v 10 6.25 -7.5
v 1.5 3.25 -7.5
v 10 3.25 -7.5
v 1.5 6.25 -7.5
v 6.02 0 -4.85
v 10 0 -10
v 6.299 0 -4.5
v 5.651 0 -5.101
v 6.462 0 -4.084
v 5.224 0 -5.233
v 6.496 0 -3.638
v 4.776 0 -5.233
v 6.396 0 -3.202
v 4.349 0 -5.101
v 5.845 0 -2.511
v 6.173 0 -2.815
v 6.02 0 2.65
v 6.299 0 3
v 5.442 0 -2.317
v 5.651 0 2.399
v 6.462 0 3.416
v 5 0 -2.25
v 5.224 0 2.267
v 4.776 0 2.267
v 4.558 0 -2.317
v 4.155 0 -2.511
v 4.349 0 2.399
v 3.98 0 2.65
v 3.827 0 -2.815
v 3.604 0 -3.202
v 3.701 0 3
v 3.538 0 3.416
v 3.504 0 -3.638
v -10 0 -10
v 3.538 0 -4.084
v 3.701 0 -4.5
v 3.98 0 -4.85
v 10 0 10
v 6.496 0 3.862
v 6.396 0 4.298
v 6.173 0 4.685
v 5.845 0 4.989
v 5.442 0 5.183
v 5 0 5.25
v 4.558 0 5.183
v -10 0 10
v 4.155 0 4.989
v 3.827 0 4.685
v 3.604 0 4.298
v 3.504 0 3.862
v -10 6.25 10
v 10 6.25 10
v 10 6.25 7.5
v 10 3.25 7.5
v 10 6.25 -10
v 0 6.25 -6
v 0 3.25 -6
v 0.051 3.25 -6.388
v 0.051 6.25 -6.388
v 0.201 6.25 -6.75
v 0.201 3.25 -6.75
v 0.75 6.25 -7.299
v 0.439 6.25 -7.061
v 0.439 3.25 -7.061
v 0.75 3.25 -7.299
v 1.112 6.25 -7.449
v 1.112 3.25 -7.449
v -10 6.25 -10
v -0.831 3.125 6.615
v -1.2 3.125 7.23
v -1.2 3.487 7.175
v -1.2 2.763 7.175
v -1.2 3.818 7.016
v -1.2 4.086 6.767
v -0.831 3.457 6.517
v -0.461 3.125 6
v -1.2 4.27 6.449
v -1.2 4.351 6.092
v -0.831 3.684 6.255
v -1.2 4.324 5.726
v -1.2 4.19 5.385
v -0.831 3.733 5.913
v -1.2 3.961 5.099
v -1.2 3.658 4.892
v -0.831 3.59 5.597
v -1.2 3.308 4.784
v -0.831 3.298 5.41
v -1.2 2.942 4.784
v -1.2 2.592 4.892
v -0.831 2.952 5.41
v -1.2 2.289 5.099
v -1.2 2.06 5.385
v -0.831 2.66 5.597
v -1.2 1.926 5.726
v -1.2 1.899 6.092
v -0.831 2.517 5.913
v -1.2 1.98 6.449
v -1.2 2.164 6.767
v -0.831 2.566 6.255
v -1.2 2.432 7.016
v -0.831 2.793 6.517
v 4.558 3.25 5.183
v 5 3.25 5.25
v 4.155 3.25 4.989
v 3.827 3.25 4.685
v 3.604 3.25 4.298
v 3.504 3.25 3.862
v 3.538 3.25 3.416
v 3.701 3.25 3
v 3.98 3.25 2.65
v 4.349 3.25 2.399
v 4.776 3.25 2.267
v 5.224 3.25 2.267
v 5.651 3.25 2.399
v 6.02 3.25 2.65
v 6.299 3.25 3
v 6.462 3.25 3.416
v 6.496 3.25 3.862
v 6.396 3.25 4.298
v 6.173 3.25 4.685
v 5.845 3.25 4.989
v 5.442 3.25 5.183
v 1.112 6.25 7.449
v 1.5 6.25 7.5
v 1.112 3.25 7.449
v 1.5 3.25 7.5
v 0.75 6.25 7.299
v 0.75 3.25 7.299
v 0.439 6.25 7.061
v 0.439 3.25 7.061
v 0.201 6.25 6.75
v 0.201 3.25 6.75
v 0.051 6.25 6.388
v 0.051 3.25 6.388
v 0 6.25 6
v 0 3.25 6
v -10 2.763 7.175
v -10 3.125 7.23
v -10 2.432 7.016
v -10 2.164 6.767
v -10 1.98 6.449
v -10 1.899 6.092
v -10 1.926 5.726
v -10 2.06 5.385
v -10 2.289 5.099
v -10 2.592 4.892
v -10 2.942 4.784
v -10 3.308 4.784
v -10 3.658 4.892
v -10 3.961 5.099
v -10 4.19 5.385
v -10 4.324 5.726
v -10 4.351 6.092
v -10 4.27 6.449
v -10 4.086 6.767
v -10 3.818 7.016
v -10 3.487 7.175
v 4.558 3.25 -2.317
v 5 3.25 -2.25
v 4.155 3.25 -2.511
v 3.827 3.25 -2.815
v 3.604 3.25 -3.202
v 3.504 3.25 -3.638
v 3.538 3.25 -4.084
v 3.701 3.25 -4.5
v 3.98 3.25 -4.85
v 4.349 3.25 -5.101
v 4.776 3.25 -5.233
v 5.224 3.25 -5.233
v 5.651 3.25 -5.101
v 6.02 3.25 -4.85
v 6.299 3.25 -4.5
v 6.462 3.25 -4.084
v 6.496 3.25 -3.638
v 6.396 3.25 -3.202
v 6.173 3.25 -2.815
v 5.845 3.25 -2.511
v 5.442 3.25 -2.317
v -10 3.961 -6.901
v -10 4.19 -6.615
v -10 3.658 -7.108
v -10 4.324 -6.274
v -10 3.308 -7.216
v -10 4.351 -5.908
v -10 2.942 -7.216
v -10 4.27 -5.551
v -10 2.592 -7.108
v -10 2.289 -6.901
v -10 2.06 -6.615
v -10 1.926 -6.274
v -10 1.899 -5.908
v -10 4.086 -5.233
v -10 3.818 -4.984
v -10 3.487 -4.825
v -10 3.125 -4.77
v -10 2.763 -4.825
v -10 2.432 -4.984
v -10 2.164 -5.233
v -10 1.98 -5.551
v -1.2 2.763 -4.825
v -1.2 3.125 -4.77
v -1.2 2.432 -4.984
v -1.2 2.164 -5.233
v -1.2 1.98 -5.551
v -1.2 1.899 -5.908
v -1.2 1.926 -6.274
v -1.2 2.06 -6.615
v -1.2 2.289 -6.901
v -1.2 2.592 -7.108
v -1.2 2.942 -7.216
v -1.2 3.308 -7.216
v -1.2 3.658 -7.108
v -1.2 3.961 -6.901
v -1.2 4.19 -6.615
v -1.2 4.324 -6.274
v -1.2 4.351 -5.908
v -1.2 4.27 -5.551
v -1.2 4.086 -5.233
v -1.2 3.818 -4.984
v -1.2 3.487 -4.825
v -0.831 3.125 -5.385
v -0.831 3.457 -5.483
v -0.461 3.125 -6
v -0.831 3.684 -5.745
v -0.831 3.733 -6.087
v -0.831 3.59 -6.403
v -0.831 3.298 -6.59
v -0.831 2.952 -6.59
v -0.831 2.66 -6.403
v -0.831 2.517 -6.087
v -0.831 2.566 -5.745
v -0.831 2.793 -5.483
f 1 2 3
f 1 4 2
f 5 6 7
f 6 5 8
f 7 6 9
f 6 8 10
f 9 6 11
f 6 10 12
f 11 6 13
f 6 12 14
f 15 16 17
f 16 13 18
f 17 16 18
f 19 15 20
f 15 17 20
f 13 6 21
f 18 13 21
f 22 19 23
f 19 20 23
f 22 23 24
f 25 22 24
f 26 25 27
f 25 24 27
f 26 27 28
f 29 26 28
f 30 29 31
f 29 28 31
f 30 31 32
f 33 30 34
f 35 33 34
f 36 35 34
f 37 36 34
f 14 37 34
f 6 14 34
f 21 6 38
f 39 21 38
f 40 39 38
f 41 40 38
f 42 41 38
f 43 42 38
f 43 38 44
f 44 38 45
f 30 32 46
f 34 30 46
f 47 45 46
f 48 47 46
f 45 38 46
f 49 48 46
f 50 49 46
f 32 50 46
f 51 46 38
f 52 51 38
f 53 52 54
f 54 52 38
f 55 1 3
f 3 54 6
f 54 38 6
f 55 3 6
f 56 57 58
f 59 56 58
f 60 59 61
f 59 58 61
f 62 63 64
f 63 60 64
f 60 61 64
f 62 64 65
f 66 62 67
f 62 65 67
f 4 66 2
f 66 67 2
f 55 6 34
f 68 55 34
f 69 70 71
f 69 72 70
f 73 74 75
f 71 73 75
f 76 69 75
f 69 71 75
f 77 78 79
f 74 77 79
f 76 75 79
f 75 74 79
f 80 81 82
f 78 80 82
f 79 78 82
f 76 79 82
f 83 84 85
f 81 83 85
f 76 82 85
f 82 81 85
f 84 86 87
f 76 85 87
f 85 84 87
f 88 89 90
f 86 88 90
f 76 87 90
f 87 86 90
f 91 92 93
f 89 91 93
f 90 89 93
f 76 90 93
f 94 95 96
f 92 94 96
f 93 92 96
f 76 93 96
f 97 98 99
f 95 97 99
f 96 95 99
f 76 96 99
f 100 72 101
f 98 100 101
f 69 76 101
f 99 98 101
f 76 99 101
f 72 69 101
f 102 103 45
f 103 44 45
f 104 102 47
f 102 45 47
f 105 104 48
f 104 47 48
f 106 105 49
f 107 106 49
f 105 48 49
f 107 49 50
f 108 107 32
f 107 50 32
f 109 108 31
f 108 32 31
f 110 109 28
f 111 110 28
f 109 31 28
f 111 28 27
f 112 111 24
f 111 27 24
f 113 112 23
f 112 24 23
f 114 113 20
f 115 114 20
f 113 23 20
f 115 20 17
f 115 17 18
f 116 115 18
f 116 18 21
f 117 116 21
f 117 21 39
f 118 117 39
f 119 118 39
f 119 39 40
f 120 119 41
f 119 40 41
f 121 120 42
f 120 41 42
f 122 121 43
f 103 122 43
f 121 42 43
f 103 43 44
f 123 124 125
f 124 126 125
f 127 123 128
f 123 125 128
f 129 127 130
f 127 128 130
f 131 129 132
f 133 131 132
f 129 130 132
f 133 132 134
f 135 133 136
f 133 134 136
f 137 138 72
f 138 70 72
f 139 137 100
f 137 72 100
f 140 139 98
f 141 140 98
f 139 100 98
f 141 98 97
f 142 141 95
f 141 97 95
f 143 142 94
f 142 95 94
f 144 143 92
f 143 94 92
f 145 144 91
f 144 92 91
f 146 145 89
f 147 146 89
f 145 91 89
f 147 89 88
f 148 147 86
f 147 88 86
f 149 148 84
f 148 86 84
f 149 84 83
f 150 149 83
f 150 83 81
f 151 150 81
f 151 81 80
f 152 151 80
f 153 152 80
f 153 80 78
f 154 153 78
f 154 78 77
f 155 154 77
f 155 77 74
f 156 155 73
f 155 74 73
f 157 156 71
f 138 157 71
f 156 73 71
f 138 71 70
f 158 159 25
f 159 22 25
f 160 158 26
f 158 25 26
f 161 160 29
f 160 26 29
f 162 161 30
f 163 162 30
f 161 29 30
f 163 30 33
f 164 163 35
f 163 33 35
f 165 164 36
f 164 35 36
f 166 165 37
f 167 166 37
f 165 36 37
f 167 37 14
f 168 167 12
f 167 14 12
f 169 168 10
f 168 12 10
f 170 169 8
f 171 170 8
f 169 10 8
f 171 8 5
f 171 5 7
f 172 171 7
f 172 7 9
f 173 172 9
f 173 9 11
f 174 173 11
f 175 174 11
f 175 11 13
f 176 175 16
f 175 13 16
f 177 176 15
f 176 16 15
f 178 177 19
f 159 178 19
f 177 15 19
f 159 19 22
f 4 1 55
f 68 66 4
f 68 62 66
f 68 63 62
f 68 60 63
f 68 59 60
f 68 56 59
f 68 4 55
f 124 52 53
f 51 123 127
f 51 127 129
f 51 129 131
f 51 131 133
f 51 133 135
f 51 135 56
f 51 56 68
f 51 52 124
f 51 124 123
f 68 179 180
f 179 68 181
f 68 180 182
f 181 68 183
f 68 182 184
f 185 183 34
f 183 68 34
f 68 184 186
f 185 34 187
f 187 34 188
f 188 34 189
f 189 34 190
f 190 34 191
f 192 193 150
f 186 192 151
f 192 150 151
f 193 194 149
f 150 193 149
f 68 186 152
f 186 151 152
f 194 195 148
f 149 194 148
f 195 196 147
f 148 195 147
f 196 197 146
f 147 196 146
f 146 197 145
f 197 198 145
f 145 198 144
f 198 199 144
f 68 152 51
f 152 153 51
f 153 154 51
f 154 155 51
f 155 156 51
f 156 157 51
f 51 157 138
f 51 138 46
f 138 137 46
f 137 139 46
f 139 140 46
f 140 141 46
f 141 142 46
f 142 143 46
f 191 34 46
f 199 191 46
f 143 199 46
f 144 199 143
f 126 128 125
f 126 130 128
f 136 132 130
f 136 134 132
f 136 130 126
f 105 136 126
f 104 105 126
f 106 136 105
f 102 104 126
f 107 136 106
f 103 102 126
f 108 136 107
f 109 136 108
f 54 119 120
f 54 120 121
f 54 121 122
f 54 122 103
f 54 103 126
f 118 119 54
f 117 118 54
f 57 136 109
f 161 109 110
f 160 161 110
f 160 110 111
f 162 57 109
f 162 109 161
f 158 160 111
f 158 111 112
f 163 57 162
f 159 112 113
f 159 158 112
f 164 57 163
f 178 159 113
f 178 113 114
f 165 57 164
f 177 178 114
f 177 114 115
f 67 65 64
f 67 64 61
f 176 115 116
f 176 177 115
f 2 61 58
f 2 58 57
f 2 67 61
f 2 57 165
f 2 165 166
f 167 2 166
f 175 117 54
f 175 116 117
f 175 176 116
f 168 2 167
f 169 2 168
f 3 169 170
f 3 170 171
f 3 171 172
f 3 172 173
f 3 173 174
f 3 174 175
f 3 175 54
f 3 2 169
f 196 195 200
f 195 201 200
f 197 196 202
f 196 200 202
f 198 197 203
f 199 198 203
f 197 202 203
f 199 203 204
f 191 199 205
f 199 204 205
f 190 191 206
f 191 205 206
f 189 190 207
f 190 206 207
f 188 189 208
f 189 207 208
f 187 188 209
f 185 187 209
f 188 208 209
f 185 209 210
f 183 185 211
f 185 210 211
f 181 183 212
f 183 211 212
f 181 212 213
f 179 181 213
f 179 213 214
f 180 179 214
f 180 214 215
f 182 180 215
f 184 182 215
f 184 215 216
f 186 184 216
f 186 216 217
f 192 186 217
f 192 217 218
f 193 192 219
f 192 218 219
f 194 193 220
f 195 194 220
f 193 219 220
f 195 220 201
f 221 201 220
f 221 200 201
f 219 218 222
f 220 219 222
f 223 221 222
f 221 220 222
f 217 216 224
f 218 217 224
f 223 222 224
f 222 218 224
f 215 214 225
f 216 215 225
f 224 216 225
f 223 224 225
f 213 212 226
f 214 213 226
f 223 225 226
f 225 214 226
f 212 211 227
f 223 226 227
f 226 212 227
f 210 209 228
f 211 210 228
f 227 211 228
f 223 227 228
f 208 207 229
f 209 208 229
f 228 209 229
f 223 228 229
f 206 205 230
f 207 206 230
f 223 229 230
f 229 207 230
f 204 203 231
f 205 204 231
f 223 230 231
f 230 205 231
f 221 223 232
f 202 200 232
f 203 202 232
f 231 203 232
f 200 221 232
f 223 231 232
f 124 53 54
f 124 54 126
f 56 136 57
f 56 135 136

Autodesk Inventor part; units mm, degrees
ref_plane "YZ Plane" through (0, 0, 0) normal (1, 0, 0) x (0, 1, 0)
ref_plane "XZ Plane" through (0, 0, 0) normal (0, 1, 0) x (-1, 0, 0)
ref_plane "XY Plane" through (0, 0, 0) normal (0, 0, 1) x (1, 0, 0)
sketch "Sketch1" plane through (0, 0, 0) normal (0, 1, 0) x (-1, 0, 0)
  line L0 (-10, -10) -> (10, -10)
  line L1 (10, -10) -> (10, 10)
  line L2 (10, 10) -> (-10, 10)
  line L3 (-10, 10) -> (-10, -10)
  line L4 (-10, -10) -> (10, 10) construction
  line L5 (10, -10) -> (-10, 10) construction
  point P0 (0, 0)
  dimension "d0" = 20
  dimension "d1" = 20
extrude "Extrusion1" add sketch "Sketch1" along normal blind 6.25
sketch "Sketch2" plane through (0, 6.25, 0) normal (0, 1, 0) x (1, 0, 0)
  line L0 (10, -7.5) -> (0, -7.5)
  line L1 (0, -7.5) -> (0, 7.5)
  line L2 (0, 7.5) -> (10, 7.5)
  line L3 (10, 7.5) -> (10, -7.5)
  line L4 (10, -10) -> (10, 10) projected
  line L5 (0, 0) -> (15, 0) construction
  line L6 (-15, 0) -> (20, 0) construction
  line L7 (-10, 10) -> (-10, -10) construction
  point P0 (0, 0)
  dimension "d4" = 15
  dimension "d5" = 10
extrude "Extrusion2" cut sketch "Sketch2" against normal blind 3
sketch "Sketch3" plane through (0, 3.25, 0) normal (0, 1, 0) x (1, 0, 0)
  line L0 (-14, 0) -> (14, 0) construction
  line L1 (10, -7.5) -> (0, -7.5) construction
  line L2 (10, -7.5) -> (0, -7.5) construction
  line L3 (5, -7.5) -> (5, 18.284) construction
  point P0 (0, 0)
  point P1 (5, -3.75)
  point P2 (5, 3.75)
  dimension "d8" = 7.5
  dimension "d26" = 3.75
hole "Hole1" at (5, 3.25, 3.75) at (5, 3.25, -3.75) direction (0, -1, 0) diameter 3 end through all
sketch "Sketch4" plane through (-10, 0, -10) normal (-1, 0, 0) x (0, 0, 1)
  line L0 (0, 0) -> (20, 0) construction
  line L1 (20, 0) -> (20, 6.25) construction
  line L2 (0, 6.25) -> (20, 6.25) construction
  line L3 (0, 0) -> (0, 6.25) construction
  line L4 (20, 3.125) -> (0, 3.125) construction
  line L5 (10, 0) -> (10, 6.25) construction
  point P0 (16, 3.125)
  point P1 (4, 3.125)
  dimension "d17" = 6
  dimension "d18" = 6
hole "Hole2" at (-10, 3.125, 6) at (-10, 3.125, -6) direction (1, 0, 0) diameter 2.459 depth 8.8 tip angle 118 thread size "M3x0.5" class "6H" standard "ANSI Metric M Profile"
fillet "Fillet1" radius 1.5 2 edges at (0, 4.75, -7.5) (0, 4.75, 7.5)
equation "\"d0\" = pillar_block_width"
equation "\"d1\" = pillar_block_length"
equation "\"d2\" = stock_6_width"
equation "\"d4\" = pillar_width"
equation "\"d6\" = stock_3_width"
equation "\"stock_6_width\" = 6.25"
equation "\"pillar_block_length\" = 20"
equation "\"pillar_block_width\" = 20"
equation "\"pillar_width\" = 15"
equation "\"stock_3_width\" = 3"
equation "\"pillar_length\" = 80"
properties part number "pillar_block" material "Aluminum 2014-T4"
